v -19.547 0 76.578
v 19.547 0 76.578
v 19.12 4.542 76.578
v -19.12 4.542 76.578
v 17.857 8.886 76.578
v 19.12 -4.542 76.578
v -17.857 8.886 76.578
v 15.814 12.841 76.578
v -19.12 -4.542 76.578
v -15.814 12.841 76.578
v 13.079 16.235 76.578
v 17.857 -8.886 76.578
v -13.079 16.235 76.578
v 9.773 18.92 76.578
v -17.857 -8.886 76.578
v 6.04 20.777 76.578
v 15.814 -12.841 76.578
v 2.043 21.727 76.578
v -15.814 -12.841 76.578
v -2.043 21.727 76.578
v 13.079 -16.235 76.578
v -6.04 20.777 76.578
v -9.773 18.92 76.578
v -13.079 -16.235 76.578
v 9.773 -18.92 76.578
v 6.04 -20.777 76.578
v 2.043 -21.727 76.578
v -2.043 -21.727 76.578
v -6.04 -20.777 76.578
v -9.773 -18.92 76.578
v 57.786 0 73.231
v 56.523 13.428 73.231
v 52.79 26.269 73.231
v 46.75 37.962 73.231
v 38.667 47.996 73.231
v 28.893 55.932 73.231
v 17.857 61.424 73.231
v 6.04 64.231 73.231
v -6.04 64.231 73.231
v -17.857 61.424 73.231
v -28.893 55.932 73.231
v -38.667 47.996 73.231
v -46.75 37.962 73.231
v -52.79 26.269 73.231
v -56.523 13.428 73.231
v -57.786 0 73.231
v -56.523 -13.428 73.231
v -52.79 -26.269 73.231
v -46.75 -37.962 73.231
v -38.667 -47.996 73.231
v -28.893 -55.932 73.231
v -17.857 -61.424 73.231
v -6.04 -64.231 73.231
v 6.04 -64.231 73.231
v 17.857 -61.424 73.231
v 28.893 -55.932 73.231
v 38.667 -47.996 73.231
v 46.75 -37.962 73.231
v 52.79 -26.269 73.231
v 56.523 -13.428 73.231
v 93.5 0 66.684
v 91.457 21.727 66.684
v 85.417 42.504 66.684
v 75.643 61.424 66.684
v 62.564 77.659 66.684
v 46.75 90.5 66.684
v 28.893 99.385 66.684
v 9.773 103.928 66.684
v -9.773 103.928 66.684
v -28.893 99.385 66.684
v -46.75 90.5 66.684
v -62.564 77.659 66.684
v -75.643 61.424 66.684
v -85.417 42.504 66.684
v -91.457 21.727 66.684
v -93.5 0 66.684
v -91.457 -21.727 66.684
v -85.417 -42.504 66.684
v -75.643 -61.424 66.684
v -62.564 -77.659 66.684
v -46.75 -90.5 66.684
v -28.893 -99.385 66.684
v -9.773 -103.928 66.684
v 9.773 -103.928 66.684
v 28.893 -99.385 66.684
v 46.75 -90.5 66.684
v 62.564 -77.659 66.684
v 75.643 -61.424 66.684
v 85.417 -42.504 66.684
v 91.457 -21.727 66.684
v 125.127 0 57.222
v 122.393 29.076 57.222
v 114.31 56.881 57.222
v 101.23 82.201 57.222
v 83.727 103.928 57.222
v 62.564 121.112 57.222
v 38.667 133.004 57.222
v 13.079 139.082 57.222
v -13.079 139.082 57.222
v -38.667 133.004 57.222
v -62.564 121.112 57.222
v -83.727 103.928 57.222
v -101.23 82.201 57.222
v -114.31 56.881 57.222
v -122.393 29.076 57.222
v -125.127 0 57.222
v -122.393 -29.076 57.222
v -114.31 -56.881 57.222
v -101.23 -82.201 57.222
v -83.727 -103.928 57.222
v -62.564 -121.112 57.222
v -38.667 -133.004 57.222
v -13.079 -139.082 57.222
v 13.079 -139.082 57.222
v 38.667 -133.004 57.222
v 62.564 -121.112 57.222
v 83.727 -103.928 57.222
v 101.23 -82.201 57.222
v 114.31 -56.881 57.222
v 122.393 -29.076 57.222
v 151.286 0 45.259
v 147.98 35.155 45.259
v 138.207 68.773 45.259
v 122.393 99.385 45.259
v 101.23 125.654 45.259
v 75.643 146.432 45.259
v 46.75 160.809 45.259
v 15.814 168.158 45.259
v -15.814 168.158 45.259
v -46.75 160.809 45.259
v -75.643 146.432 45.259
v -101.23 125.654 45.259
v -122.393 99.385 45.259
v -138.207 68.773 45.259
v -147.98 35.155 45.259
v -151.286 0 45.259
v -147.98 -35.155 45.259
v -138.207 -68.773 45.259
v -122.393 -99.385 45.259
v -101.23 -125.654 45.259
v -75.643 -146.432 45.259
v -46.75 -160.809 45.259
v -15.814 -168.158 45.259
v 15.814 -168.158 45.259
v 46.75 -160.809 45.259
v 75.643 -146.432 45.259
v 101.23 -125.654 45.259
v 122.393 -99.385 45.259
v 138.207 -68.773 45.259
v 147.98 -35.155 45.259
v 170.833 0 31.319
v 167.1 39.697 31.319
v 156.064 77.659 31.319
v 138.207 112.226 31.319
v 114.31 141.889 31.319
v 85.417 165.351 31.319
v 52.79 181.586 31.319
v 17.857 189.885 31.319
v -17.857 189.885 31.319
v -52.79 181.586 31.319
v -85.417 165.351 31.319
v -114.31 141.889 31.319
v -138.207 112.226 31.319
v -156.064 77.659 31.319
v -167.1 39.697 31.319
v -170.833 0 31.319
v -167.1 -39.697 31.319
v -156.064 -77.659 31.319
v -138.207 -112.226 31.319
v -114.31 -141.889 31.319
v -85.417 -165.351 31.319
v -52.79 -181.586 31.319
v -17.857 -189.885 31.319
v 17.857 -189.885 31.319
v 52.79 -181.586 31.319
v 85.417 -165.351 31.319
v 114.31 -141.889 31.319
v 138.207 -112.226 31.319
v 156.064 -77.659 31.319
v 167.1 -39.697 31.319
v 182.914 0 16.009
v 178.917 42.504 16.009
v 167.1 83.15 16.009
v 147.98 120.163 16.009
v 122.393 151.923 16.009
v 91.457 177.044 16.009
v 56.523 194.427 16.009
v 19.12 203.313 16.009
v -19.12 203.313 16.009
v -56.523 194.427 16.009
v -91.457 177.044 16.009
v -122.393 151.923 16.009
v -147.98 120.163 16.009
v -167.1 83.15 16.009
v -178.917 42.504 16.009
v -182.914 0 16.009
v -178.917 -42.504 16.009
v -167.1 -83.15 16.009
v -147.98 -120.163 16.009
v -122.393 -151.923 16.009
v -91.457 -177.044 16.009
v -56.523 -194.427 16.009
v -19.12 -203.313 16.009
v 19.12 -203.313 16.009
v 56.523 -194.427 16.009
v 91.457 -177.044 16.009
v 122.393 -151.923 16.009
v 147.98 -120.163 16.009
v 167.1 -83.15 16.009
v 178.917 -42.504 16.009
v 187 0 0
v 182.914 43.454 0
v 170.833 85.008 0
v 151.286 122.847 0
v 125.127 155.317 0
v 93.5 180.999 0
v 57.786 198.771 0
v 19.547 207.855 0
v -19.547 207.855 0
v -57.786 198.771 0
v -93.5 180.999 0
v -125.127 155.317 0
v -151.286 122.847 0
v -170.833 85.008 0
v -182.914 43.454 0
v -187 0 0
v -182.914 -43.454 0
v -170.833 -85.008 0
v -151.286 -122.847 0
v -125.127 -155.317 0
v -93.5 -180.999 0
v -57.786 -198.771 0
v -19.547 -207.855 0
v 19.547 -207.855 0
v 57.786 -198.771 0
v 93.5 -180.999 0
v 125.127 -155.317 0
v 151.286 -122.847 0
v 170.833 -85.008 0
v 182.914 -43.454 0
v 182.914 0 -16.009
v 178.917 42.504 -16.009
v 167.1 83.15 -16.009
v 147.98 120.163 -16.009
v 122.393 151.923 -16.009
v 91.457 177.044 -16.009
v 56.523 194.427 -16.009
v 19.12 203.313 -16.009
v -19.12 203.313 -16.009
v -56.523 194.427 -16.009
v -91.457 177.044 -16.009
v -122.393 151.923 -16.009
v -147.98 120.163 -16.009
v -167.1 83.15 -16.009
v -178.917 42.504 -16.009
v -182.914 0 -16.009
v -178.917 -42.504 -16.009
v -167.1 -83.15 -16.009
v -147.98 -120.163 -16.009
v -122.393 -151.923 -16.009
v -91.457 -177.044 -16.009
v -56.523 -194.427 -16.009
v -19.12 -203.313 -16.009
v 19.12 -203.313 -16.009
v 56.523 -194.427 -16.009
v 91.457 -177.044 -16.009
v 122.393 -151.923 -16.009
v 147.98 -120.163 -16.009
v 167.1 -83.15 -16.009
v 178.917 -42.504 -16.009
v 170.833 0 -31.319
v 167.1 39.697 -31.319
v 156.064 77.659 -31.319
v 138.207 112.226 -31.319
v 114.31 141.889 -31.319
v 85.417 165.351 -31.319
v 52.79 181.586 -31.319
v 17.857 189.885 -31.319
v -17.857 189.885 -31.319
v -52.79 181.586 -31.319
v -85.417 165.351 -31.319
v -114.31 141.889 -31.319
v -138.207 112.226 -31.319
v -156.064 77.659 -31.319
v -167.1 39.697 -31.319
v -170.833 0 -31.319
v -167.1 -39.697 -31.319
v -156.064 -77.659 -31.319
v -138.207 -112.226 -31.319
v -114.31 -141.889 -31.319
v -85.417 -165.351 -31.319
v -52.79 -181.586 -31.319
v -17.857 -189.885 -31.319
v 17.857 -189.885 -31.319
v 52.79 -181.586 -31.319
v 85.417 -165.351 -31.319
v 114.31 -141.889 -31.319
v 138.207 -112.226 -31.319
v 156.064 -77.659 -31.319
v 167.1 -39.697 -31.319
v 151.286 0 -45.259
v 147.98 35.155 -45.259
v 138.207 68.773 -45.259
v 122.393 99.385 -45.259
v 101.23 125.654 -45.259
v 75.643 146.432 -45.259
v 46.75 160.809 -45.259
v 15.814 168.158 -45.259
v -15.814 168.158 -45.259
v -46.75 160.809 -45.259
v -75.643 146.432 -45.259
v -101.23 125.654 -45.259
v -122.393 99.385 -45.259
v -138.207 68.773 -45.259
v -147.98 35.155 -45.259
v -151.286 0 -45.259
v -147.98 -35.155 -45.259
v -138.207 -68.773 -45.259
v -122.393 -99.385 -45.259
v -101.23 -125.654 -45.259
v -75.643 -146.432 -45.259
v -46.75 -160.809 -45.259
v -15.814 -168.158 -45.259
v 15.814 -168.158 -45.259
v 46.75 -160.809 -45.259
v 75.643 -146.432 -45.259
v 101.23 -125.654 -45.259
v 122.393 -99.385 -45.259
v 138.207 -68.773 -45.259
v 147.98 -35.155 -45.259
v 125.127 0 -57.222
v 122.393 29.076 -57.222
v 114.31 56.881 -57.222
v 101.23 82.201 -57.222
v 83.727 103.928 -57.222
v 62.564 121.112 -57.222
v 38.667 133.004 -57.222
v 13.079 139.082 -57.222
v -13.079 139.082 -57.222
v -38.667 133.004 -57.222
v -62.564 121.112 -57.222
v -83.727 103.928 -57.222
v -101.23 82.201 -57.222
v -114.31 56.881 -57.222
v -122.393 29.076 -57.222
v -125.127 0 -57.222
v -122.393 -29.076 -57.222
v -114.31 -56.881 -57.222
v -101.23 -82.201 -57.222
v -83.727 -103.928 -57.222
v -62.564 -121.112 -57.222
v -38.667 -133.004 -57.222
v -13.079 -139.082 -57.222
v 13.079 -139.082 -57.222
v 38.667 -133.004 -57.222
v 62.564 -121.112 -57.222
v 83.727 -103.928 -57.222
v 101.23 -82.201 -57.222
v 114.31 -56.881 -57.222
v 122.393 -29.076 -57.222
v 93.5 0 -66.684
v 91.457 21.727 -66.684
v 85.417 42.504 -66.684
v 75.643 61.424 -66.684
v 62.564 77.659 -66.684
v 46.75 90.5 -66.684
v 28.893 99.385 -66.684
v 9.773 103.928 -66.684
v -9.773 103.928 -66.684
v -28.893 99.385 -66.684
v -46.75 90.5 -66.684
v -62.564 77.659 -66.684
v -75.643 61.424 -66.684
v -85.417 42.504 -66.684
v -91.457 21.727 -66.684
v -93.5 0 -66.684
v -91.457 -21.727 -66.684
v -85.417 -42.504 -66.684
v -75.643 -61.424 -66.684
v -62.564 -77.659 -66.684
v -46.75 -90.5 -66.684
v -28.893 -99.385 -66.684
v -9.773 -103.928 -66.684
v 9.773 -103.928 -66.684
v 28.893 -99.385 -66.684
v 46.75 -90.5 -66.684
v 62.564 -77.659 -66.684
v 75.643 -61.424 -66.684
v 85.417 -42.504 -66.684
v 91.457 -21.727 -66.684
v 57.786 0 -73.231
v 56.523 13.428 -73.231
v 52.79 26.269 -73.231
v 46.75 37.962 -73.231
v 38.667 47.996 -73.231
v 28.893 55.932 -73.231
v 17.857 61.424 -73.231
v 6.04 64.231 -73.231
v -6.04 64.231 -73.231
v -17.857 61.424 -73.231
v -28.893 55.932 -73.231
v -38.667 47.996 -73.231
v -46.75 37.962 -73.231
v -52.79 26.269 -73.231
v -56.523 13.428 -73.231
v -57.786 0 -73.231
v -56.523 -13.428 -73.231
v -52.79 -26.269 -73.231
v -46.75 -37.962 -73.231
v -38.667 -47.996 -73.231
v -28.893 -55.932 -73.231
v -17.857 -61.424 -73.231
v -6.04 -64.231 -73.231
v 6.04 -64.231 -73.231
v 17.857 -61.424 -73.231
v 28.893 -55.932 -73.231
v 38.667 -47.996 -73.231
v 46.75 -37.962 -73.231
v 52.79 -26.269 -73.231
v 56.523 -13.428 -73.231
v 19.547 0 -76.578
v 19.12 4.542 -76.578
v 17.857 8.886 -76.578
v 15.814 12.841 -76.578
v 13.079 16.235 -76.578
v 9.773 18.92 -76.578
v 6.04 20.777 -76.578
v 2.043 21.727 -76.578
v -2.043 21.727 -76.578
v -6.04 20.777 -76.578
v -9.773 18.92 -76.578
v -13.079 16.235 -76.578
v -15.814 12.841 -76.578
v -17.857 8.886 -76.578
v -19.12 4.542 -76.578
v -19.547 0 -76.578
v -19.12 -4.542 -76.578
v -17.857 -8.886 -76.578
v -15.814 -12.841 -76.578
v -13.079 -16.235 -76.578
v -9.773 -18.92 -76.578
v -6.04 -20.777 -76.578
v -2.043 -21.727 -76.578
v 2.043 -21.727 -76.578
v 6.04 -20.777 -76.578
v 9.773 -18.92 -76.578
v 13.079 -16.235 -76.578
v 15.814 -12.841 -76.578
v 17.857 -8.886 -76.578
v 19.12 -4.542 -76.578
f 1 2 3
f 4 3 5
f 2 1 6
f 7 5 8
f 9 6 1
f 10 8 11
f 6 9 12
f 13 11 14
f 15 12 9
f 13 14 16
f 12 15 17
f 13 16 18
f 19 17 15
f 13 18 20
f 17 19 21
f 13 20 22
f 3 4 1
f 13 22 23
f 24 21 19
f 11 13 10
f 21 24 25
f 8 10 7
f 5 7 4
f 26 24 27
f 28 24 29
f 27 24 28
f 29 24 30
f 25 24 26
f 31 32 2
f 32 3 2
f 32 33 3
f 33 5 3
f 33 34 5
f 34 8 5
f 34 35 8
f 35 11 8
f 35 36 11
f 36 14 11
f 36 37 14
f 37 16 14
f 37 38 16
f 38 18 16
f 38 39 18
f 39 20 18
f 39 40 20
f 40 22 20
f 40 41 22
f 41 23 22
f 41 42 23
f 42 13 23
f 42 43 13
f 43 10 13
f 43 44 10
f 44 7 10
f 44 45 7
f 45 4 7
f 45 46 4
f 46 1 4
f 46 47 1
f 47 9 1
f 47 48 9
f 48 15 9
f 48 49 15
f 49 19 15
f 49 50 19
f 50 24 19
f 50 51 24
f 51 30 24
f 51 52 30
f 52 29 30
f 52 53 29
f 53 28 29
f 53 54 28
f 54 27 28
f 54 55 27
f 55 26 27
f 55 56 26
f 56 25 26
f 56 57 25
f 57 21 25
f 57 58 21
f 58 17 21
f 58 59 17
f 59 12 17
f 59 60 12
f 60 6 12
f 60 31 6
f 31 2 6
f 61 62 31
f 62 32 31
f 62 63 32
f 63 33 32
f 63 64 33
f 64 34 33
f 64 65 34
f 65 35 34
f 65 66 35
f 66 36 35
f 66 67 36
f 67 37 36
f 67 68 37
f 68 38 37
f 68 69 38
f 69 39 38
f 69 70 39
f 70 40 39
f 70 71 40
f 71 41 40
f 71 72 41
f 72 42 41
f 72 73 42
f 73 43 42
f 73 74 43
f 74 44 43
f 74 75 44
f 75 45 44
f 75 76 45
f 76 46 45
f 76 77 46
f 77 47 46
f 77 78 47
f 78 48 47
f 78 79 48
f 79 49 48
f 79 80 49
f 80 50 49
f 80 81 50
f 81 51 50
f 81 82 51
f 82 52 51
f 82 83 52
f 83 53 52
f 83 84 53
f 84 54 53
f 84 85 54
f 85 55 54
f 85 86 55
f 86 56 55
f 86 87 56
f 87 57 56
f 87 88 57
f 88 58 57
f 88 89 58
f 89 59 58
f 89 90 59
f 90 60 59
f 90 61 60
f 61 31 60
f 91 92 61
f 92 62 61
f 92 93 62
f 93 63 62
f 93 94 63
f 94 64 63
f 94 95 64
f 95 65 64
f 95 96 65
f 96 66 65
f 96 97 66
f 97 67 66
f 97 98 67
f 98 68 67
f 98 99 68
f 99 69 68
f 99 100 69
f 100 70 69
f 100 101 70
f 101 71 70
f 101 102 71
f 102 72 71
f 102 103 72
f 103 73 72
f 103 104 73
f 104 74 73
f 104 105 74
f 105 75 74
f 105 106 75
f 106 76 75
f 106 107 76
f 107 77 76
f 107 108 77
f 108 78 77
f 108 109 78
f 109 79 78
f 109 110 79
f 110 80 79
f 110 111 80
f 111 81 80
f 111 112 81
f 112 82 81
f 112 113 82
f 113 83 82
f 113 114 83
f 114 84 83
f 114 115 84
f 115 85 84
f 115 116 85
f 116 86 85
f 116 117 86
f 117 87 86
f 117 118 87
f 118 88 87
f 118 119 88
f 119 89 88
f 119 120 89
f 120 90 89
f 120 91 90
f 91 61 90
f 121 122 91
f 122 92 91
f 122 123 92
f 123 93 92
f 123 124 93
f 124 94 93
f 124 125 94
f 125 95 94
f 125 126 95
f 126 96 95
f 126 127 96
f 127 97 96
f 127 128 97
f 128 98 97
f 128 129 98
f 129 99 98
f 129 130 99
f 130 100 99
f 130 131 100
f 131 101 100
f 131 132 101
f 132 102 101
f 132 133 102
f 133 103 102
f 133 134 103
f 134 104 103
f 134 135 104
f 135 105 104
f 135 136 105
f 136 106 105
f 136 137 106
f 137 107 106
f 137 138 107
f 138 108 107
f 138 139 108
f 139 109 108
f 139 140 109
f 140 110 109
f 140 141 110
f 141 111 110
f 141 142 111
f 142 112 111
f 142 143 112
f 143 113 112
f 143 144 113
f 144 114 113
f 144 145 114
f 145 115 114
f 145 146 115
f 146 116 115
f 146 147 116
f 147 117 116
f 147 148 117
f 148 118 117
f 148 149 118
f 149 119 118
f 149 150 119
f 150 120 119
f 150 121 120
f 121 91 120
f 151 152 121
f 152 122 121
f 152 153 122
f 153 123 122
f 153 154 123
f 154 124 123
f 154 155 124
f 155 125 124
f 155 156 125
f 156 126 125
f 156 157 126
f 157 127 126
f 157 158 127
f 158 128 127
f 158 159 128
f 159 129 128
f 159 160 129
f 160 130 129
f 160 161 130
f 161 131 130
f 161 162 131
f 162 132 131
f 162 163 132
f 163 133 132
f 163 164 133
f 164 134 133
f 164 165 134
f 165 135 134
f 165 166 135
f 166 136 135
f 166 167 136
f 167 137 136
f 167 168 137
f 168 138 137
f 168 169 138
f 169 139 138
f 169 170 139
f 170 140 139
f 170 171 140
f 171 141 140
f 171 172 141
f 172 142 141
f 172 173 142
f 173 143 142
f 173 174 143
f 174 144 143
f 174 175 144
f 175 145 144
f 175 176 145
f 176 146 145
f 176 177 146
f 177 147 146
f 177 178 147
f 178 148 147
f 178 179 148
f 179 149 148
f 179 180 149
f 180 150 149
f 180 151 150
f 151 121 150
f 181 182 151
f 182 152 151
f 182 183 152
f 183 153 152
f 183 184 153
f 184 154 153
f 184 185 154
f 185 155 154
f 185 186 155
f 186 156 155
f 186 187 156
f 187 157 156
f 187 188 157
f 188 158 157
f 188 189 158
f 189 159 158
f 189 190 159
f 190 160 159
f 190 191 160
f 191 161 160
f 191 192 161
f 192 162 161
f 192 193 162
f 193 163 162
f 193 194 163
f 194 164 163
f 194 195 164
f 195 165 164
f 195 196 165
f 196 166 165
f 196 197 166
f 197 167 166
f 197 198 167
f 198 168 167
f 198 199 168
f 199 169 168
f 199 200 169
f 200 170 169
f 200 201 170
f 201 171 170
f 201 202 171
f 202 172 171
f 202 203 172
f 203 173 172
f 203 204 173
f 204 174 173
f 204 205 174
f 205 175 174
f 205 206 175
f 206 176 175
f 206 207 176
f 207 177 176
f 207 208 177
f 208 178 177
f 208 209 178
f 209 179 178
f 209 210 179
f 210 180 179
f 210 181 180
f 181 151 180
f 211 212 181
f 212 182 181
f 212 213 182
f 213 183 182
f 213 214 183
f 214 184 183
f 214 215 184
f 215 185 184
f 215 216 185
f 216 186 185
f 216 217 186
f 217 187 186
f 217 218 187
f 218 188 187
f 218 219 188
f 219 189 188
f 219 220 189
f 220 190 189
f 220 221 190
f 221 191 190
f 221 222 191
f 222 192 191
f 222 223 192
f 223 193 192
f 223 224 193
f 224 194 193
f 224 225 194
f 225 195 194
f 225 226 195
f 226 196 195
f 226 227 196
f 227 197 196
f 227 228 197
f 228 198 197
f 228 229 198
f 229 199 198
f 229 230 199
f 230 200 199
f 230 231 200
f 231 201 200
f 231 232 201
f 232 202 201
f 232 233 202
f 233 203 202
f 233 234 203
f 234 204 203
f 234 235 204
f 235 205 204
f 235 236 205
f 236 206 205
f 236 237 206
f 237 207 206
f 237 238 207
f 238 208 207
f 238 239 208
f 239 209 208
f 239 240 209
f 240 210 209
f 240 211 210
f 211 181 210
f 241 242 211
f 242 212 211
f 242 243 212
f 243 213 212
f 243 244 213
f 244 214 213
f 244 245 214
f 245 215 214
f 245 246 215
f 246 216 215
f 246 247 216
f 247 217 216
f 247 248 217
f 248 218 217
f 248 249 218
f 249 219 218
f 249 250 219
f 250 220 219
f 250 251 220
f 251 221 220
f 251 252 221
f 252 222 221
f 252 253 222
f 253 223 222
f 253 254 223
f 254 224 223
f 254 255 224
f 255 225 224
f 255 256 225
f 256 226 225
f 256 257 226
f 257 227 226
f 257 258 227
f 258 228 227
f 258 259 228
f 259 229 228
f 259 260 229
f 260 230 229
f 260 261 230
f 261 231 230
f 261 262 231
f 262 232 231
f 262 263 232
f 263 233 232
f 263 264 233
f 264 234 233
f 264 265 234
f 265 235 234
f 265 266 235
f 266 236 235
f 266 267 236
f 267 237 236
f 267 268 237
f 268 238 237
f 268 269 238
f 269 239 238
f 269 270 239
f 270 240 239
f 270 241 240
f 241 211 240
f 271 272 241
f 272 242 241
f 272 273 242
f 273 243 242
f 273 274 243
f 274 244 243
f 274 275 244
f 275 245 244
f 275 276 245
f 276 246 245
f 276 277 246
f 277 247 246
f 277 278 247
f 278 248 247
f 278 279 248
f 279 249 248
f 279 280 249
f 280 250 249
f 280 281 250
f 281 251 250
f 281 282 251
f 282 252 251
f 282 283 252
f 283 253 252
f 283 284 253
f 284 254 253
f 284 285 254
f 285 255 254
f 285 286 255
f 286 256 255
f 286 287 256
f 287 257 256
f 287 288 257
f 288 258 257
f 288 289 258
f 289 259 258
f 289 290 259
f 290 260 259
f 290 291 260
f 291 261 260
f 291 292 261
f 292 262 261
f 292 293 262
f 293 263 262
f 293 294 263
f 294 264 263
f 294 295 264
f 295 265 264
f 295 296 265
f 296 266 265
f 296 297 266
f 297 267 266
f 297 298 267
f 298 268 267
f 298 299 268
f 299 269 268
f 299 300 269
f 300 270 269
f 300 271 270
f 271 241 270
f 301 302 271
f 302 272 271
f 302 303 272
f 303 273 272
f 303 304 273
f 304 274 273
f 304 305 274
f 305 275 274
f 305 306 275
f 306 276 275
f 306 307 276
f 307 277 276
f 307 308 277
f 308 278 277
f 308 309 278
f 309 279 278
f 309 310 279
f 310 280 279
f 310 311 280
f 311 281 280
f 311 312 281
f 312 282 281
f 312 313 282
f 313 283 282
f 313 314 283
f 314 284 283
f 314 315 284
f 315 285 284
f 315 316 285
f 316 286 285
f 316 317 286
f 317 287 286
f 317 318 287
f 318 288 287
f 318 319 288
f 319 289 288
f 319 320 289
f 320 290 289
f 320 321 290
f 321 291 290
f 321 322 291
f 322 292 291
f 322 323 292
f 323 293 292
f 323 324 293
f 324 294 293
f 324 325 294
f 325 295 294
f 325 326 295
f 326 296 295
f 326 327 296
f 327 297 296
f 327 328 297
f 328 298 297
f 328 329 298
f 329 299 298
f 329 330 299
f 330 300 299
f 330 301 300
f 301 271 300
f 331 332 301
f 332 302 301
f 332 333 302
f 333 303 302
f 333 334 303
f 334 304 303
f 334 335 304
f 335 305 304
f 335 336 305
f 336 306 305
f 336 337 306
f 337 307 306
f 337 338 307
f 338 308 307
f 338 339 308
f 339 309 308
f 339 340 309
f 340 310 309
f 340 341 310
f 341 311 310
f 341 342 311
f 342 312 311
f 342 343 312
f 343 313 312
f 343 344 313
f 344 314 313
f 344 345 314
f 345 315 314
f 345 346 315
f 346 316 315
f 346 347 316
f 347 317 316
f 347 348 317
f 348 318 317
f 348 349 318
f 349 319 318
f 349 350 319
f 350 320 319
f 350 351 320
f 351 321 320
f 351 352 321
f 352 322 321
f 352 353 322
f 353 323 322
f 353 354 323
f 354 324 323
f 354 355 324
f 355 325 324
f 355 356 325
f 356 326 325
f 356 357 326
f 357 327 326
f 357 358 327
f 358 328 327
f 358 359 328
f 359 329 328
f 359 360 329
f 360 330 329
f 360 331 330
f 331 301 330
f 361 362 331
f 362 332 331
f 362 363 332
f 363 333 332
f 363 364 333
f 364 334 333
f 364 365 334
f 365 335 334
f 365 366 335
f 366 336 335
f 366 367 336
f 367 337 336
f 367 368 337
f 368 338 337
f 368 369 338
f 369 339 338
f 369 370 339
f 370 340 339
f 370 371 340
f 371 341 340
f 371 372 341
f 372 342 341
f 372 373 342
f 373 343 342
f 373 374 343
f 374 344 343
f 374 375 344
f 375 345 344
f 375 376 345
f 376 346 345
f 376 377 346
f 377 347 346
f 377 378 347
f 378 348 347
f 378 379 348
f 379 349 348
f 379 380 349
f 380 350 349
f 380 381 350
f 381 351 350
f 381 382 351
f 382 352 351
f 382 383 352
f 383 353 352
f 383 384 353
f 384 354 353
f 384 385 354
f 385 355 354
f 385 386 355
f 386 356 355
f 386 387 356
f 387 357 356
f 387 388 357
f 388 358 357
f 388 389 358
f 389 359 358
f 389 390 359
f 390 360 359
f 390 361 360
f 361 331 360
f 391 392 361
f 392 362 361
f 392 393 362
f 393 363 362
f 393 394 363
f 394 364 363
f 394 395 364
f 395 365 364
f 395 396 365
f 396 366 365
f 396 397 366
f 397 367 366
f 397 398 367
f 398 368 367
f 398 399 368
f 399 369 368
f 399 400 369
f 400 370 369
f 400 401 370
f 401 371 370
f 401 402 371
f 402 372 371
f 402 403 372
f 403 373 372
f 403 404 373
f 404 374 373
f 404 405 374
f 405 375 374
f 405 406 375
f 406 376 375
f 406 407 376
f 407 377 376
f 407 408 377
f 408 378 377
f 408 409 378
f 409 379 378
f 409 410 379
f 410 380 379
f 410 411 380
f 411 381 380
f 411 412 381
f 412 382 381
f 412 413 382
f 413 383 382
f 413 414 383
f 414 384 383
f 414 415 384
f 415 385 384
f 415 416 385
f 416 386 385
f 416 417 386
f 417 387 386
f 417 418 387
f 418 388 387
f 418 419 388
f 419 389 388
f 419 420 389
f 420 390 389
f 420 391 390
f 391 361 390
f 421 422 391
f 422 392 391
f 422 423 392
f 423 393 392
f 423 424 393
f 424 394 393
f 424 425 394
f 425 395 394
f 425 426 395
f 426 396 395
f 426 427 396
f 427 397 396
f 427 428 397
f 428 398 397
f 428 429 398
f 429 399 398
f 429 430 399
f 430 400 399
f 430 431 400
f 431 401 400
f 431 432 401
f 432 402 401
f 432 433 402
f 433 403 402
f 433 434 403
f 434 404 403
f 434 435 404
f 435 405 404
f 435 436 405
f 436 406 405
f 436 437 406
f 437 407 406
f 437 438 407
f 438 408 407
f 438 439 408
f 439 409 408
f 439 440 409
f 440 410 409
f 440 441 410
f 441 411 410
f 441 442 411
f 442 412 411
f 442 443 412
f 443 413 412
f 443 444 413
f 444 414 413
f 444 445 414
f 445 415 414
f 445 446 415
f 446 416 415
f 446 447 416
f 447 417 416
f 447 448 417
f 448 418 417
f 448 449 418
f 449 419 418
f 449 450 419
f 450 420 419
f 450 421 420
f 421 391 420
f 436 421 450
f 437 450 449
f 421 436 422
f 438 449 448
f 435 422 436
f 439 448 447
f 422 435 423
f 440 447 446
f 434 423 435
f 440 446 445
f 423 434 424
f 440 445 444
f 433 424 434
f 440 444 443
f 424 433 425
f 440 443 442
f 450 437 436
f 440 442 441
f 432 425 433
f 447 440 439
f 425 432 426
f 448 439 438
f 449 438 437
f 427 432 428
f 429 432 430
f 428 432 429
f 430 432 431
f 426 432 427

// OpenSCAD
// Generated by SolidPython 1.0.1 on 2020-07-29 00:46:53


scale(v = [17, 19, 7]) {
	sphere(r = 11);
}
/***********************************************
*********      SolidPython code:      **********
************************************************
 
# import packages: SolidPython
from solid import *
from solid.utils import *
from itertools import chain, combinations, permutations


class Resize:

    def __init__(self, scad_file):
        self.scad_file = scad_file
        #self.scad_file = import_scad(scad_file)
        # cone/cylinder param:
        self.r1 = 0
        self.r2 = 0
        self.h = 0
        # rectangular prism param:
        self.w = 0
        self.l = 0
        # ellipse param:
        self.r = 0

    # import OpenScad code (file name corresponds to shape)


    # classify shape + parameters
    def assign(self, param1, param2, param3):
        if self.scad_file == 'cone.scad':
            self.r1 = param1
            self.r2 = param2
            self.h = param3
        elif self.scad_file == 'cylinder.scad':
            self.r1 = param1
            self.r2 = param2
            self.h = param3
        elif self.scad_file == 'rectangularPrism.scad':
            self.h = param1
            self.l = param2
            self.w = param3
        else:
            self.r = param1
            self.h = param2

    # resize parameters
    def iterate(self):
        x = range(3, 20, 2)
        i = 1
        if self.scad_file == 'cone.scad':
            tempList = list(permutations(x, 2))
            for temp in tempList:
                param1 = temp[0]
                param2 = temp[1]
                filepath = 'produced_scad_files/' + 'cone' + str(param1) + '_' + str(param2) + '_' + '.scad'
                scad_render_to_file(cylinder(h=param1, r1=param2, r2=0), filepath)

        elif self.scad_file == 'cylinder.scad':
            tempList = list(permutations(x, 3))
            for temp in tempList:
                param1 = temp[0]
                param2 = temp[1]
                filepath = 'produced_scad_files/' + 'cylinder' + str(param1) + '_' + str(param2) + '_' + '.scad'
                scad_render_to_file(cylinder(h=param1, r1=param2, r2=param2), filepath)

        elif self.scad_file == 'rectangularPrism.scad':
            tempList = list(permutations(x, 3))
            for temp in tempList:
                param1 = temp[0]
                param2 = temp[1]
                param3 = temp[2]
                filepath = 'produced_scad_files/' + 'rectangularPrism' + str(param1) + '_' + str(param2) + '_' + str(
                    param3) + '.scad'
                scad_render_to_file(cube(size=(param1, param2, param3)), filepath)

        elif self.scad_file == 'ellipse.scad':
            tempList = list(permutations(x, 4))
            for temp in tempList:
                param1 = temp[0]
                param2 = temp[1]
                param3 = temp[2]
                param4 = temp[3]
                filepath = 'produced_scad_files/' + 'ellipse' + str(param1) + '_' + str(param2) + '_' + str(param3) + '_' + str(param4) + '.scad'
                scad_render_to_file(scale([param1, param2, param3])(sphere(r=param4)), filepath)

    def render_to_scadfile(self):
        scad_render_to_file(scad, 'example.scad') 
 
************************************************/
